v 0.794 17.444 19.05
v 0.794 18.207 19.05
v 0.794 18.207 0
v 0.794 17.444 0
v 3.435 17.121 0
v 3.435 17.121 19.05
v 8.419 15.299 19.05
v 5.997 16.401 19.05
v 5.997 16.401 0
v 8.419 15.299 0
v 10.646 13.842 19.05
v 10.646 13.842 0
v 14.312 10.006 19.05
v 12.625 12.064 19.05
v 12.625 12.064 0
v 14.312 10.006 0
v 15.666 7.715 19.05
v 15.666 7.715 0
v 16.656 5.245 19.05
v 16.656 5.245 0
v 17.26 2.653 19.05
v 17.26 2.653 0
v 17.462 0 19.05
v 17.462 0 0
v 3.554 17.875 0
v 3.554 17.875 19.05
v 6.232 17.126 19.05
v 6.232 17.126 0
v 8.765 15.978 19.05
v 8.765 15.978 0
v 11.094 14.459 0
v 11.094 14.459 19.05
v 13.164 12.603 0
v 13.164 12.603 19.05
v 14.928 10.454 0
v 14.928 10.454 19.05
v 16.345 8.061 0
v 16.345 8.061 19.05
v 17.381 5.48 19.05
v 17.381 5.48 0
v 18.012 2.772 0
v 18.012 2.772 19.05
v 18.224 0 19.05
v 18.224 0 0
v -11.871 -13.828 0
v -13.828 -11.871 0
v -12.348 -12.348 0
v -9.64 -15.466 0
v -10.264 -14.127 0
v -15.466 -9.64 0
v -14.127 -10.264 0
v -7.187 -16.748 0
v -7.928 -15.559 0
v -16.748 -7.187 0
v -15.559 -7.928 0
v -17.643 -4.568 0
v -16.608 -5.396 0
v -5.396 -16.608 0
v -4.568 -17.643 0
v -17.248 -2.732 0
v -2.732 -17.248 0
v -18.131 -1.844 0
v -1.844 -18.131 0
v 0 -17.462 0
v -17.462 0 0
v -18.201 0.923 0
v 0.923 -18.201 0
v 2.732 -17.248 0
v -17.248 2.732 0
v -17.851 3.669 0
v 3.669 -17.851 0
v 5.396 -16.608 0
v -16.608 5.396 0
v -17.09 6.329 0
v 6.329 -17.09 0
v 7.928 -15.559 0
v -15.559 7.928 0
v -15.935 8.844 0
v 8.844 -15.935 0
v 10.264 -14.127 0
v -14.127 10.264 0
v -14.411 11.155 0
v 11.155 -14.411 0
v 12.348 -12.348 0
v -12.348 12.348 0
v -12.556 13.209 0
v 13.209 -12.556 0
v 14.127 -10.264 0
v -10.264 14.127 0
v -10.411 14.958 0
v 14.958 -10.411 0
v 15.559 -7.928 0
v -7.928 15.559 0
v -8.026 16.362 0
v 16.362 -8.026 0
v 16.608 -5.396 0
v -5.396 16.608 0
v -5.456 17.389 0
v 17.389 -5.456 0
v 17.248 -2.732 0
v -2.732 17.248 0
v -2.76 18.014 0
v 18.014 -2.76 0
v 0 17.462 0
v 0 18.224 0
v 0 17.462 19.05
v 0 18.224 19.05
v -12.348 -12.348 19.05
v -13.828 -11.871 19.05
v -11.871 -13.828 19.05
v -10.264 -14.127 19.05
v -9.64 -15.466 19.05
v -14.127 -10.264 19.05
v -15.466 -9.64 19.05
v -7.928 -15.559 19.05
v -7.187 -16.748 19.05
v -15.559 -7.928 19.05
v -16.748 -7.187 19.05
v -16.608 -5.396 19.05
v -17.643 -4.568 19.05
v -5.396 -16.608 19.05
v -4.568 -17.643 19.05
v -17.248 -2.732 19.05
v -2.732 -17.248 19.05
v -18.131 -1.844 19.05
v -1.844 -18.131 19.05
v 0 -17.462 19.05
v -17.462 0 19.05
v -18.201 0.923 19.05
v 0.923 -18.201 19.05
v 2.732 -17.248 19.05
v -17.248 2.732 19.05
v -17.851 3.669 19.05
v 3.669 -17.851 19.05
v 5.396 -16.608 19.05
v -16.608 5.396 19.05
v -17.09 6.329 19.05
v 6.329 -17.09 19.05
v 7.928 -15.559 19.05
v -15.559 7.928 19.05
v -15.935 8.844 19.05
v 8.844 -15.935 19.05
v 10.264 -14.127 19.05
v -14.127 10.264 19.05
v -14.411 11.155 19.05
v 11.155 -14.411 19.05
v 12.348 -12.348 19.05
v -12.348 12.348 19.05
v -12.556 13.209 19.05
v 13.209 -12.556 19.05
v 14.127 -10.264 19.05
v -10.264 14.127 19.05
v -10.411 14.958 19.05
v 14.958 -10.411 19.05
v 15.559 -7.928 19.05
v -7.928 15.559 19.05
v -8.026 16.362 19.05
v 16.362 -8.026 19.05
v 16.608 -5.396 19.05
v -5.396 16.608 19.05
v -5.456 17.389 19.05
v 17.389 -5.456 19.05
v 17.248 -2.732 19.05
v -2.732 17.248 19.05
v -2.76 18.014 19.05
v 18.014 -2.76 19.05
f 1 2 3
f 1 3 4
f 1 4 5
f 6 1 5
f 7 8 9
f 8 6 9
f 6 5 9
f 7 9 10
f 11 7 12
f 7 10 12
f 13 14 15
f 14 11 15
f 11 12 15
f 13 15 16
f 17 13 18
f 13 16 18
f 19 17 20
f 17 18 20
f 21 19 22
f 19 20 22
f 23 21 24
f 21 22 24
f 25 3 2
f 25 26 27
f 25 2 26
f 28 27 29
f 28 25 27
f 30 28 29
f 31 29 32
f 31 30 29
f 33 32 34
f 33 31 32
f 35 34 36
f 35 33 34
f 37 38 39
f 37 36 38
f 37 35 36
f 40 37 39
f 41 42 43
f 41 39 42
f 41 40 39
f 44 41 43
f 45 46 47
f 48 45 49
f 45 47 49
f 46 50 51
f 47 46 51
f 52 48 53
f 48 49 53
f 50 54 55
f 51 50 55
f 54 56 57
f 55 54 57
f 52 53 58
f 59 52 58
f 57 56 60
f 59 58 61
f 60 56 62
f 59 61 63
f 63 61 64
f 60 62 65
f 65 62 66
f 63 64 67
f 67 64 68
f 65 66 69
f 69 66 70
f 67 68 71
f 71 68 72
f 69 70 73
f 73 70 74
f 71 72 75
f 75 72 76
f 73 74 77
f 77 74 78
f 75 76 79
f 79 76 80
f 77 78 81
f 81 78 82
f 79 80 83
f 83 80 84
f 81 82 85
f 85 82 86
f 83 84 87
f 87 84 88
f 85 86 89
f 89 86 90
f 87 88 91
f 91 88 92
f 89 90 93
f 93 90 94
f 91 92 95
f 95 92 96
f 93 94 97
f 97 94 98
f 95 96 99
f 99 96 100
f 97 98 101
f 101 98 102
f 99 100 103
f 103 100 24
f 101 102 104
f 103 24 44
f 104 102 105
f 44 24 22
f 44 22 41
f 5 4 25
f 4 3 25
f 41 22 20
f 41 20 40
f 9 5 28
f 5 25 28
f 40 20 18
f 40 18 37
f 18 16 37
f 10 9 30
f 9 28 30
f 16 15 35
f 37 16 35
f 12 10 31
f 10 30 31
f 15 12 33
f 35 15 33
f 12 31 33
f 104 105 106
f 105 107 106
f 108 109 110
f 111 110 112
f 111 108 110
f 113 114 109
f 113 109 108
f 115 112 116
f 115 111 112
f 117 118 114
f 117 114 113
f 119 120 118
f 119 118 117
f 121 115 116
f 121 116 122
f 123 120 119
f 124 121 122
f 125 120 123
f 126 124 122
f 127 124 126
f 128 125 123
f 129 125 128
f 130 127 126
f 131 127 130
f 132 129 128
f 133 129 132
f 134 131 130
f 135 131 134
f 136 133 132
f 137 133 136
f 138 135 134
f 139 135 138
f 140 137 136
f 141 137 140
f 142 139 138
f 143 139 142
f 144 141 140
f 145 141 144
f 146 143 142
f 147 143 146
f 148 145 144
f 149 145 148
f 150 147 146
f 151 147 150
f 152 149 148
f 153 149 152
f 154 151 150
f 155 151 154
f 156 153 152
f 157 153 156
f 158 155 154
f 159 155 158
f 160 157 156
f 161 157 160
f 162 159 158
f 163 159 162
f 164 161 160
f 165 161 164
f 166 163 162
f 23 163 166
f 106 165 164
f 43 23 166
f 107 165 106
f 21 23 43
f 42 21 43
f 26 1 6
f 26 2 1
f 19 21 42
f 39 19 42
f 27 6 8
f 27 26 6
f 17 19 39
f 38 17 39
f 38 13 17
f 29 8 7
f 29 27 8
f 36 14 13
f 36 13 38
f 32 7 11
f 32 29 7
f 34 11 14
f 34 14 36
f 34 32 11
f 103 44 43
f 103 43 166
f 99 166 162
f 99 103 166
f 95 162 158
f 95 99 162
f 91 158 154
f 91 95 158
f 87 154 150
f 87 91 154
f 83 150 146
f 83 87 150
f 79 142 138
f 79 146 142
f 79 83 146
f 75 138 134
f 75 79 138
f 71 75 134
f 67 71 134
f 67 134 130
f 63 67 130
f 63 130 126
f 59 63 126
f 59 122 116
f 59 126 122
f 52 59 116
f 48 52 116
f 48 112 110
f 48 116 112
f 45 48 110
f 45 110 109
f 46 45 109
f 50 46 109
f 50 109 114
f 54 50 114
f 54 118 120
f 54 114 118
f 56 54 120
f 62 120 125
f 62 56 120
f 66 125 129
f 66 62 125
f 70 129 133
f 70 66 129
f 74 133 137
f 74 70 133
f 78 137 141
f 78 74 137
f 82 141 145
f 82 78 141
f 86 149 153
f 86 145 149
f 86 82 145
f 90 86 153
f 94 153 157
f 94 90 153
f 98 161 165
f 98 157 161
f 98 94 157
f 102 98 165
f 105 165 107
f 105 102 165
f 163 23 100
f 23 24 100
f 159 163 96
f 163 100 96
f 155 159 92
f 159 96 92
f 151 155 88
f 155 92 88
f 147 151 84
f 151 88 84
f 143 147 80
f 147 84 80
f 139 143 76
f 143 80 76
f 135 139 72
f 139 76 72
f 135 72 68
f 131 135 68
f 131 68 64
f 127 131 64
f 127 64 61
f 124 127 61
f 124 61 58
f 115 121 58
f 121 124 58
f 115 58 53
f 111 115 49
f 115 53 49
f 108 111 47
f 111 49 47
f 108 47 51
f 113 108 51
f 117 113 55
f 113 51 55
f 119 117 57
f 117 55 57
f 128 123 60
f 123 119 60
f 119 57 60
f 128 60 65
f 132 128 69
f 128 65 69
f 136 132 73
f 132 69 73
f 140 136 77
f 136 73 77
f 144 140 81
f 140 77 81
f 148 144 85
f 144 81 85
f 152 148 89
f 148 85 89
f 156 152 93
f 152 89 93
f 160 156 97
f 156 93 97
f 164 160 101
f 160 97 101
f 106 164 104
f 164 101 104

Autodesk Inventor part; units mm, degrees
ref_plane "YZ Plane" through (0, 0, 0) normal (1, 0, 0) x (0, 1, 0)
ref_plane "XZ Plane" through (0, 0, 0) normal (0, 1, 0) x (-1, 0, 0)
ref_plane "XY Plane" through (0, 0, 0) normal (0, 0, 1) x (1, 0, 0)
sketch "Sketch1" plane through (0, 0, 0) normal (0, 0, 1) x (1, 0, 0)
  circle A0 centre (0, 0) radius 17.4625
  circle A1 centre (0, 0) radius 18.2245
  dimension "d0" = 34.925
  dimension "d1" = 36.449
extrude "Extrusion1" add sketch "Sketch1" along normal blind 19.05
sketch "Sketch2" plane through (0, 0, 19.05) normal (0, 0, 1) x (1, 0, 0)
  circle A0 centre (0, 0) radius 18.2245 projected
  line L0 (0, 18.2245) -> (0, 17.4625)
  circle A1 centre (0, 0) radius 17.4625 projected
  line L1 (0.7937, 18.2072) -> (0.7937, 17.4445)
  dimension "d4" = 0.7937
extrude "Extrusion2" cut sketch "Sketch2" against normal blind 19.05 contours L1 A1 L0 A0 picked at (0.7055, 17.702)
properties part number "Buffer" material "PBT Plastic"
